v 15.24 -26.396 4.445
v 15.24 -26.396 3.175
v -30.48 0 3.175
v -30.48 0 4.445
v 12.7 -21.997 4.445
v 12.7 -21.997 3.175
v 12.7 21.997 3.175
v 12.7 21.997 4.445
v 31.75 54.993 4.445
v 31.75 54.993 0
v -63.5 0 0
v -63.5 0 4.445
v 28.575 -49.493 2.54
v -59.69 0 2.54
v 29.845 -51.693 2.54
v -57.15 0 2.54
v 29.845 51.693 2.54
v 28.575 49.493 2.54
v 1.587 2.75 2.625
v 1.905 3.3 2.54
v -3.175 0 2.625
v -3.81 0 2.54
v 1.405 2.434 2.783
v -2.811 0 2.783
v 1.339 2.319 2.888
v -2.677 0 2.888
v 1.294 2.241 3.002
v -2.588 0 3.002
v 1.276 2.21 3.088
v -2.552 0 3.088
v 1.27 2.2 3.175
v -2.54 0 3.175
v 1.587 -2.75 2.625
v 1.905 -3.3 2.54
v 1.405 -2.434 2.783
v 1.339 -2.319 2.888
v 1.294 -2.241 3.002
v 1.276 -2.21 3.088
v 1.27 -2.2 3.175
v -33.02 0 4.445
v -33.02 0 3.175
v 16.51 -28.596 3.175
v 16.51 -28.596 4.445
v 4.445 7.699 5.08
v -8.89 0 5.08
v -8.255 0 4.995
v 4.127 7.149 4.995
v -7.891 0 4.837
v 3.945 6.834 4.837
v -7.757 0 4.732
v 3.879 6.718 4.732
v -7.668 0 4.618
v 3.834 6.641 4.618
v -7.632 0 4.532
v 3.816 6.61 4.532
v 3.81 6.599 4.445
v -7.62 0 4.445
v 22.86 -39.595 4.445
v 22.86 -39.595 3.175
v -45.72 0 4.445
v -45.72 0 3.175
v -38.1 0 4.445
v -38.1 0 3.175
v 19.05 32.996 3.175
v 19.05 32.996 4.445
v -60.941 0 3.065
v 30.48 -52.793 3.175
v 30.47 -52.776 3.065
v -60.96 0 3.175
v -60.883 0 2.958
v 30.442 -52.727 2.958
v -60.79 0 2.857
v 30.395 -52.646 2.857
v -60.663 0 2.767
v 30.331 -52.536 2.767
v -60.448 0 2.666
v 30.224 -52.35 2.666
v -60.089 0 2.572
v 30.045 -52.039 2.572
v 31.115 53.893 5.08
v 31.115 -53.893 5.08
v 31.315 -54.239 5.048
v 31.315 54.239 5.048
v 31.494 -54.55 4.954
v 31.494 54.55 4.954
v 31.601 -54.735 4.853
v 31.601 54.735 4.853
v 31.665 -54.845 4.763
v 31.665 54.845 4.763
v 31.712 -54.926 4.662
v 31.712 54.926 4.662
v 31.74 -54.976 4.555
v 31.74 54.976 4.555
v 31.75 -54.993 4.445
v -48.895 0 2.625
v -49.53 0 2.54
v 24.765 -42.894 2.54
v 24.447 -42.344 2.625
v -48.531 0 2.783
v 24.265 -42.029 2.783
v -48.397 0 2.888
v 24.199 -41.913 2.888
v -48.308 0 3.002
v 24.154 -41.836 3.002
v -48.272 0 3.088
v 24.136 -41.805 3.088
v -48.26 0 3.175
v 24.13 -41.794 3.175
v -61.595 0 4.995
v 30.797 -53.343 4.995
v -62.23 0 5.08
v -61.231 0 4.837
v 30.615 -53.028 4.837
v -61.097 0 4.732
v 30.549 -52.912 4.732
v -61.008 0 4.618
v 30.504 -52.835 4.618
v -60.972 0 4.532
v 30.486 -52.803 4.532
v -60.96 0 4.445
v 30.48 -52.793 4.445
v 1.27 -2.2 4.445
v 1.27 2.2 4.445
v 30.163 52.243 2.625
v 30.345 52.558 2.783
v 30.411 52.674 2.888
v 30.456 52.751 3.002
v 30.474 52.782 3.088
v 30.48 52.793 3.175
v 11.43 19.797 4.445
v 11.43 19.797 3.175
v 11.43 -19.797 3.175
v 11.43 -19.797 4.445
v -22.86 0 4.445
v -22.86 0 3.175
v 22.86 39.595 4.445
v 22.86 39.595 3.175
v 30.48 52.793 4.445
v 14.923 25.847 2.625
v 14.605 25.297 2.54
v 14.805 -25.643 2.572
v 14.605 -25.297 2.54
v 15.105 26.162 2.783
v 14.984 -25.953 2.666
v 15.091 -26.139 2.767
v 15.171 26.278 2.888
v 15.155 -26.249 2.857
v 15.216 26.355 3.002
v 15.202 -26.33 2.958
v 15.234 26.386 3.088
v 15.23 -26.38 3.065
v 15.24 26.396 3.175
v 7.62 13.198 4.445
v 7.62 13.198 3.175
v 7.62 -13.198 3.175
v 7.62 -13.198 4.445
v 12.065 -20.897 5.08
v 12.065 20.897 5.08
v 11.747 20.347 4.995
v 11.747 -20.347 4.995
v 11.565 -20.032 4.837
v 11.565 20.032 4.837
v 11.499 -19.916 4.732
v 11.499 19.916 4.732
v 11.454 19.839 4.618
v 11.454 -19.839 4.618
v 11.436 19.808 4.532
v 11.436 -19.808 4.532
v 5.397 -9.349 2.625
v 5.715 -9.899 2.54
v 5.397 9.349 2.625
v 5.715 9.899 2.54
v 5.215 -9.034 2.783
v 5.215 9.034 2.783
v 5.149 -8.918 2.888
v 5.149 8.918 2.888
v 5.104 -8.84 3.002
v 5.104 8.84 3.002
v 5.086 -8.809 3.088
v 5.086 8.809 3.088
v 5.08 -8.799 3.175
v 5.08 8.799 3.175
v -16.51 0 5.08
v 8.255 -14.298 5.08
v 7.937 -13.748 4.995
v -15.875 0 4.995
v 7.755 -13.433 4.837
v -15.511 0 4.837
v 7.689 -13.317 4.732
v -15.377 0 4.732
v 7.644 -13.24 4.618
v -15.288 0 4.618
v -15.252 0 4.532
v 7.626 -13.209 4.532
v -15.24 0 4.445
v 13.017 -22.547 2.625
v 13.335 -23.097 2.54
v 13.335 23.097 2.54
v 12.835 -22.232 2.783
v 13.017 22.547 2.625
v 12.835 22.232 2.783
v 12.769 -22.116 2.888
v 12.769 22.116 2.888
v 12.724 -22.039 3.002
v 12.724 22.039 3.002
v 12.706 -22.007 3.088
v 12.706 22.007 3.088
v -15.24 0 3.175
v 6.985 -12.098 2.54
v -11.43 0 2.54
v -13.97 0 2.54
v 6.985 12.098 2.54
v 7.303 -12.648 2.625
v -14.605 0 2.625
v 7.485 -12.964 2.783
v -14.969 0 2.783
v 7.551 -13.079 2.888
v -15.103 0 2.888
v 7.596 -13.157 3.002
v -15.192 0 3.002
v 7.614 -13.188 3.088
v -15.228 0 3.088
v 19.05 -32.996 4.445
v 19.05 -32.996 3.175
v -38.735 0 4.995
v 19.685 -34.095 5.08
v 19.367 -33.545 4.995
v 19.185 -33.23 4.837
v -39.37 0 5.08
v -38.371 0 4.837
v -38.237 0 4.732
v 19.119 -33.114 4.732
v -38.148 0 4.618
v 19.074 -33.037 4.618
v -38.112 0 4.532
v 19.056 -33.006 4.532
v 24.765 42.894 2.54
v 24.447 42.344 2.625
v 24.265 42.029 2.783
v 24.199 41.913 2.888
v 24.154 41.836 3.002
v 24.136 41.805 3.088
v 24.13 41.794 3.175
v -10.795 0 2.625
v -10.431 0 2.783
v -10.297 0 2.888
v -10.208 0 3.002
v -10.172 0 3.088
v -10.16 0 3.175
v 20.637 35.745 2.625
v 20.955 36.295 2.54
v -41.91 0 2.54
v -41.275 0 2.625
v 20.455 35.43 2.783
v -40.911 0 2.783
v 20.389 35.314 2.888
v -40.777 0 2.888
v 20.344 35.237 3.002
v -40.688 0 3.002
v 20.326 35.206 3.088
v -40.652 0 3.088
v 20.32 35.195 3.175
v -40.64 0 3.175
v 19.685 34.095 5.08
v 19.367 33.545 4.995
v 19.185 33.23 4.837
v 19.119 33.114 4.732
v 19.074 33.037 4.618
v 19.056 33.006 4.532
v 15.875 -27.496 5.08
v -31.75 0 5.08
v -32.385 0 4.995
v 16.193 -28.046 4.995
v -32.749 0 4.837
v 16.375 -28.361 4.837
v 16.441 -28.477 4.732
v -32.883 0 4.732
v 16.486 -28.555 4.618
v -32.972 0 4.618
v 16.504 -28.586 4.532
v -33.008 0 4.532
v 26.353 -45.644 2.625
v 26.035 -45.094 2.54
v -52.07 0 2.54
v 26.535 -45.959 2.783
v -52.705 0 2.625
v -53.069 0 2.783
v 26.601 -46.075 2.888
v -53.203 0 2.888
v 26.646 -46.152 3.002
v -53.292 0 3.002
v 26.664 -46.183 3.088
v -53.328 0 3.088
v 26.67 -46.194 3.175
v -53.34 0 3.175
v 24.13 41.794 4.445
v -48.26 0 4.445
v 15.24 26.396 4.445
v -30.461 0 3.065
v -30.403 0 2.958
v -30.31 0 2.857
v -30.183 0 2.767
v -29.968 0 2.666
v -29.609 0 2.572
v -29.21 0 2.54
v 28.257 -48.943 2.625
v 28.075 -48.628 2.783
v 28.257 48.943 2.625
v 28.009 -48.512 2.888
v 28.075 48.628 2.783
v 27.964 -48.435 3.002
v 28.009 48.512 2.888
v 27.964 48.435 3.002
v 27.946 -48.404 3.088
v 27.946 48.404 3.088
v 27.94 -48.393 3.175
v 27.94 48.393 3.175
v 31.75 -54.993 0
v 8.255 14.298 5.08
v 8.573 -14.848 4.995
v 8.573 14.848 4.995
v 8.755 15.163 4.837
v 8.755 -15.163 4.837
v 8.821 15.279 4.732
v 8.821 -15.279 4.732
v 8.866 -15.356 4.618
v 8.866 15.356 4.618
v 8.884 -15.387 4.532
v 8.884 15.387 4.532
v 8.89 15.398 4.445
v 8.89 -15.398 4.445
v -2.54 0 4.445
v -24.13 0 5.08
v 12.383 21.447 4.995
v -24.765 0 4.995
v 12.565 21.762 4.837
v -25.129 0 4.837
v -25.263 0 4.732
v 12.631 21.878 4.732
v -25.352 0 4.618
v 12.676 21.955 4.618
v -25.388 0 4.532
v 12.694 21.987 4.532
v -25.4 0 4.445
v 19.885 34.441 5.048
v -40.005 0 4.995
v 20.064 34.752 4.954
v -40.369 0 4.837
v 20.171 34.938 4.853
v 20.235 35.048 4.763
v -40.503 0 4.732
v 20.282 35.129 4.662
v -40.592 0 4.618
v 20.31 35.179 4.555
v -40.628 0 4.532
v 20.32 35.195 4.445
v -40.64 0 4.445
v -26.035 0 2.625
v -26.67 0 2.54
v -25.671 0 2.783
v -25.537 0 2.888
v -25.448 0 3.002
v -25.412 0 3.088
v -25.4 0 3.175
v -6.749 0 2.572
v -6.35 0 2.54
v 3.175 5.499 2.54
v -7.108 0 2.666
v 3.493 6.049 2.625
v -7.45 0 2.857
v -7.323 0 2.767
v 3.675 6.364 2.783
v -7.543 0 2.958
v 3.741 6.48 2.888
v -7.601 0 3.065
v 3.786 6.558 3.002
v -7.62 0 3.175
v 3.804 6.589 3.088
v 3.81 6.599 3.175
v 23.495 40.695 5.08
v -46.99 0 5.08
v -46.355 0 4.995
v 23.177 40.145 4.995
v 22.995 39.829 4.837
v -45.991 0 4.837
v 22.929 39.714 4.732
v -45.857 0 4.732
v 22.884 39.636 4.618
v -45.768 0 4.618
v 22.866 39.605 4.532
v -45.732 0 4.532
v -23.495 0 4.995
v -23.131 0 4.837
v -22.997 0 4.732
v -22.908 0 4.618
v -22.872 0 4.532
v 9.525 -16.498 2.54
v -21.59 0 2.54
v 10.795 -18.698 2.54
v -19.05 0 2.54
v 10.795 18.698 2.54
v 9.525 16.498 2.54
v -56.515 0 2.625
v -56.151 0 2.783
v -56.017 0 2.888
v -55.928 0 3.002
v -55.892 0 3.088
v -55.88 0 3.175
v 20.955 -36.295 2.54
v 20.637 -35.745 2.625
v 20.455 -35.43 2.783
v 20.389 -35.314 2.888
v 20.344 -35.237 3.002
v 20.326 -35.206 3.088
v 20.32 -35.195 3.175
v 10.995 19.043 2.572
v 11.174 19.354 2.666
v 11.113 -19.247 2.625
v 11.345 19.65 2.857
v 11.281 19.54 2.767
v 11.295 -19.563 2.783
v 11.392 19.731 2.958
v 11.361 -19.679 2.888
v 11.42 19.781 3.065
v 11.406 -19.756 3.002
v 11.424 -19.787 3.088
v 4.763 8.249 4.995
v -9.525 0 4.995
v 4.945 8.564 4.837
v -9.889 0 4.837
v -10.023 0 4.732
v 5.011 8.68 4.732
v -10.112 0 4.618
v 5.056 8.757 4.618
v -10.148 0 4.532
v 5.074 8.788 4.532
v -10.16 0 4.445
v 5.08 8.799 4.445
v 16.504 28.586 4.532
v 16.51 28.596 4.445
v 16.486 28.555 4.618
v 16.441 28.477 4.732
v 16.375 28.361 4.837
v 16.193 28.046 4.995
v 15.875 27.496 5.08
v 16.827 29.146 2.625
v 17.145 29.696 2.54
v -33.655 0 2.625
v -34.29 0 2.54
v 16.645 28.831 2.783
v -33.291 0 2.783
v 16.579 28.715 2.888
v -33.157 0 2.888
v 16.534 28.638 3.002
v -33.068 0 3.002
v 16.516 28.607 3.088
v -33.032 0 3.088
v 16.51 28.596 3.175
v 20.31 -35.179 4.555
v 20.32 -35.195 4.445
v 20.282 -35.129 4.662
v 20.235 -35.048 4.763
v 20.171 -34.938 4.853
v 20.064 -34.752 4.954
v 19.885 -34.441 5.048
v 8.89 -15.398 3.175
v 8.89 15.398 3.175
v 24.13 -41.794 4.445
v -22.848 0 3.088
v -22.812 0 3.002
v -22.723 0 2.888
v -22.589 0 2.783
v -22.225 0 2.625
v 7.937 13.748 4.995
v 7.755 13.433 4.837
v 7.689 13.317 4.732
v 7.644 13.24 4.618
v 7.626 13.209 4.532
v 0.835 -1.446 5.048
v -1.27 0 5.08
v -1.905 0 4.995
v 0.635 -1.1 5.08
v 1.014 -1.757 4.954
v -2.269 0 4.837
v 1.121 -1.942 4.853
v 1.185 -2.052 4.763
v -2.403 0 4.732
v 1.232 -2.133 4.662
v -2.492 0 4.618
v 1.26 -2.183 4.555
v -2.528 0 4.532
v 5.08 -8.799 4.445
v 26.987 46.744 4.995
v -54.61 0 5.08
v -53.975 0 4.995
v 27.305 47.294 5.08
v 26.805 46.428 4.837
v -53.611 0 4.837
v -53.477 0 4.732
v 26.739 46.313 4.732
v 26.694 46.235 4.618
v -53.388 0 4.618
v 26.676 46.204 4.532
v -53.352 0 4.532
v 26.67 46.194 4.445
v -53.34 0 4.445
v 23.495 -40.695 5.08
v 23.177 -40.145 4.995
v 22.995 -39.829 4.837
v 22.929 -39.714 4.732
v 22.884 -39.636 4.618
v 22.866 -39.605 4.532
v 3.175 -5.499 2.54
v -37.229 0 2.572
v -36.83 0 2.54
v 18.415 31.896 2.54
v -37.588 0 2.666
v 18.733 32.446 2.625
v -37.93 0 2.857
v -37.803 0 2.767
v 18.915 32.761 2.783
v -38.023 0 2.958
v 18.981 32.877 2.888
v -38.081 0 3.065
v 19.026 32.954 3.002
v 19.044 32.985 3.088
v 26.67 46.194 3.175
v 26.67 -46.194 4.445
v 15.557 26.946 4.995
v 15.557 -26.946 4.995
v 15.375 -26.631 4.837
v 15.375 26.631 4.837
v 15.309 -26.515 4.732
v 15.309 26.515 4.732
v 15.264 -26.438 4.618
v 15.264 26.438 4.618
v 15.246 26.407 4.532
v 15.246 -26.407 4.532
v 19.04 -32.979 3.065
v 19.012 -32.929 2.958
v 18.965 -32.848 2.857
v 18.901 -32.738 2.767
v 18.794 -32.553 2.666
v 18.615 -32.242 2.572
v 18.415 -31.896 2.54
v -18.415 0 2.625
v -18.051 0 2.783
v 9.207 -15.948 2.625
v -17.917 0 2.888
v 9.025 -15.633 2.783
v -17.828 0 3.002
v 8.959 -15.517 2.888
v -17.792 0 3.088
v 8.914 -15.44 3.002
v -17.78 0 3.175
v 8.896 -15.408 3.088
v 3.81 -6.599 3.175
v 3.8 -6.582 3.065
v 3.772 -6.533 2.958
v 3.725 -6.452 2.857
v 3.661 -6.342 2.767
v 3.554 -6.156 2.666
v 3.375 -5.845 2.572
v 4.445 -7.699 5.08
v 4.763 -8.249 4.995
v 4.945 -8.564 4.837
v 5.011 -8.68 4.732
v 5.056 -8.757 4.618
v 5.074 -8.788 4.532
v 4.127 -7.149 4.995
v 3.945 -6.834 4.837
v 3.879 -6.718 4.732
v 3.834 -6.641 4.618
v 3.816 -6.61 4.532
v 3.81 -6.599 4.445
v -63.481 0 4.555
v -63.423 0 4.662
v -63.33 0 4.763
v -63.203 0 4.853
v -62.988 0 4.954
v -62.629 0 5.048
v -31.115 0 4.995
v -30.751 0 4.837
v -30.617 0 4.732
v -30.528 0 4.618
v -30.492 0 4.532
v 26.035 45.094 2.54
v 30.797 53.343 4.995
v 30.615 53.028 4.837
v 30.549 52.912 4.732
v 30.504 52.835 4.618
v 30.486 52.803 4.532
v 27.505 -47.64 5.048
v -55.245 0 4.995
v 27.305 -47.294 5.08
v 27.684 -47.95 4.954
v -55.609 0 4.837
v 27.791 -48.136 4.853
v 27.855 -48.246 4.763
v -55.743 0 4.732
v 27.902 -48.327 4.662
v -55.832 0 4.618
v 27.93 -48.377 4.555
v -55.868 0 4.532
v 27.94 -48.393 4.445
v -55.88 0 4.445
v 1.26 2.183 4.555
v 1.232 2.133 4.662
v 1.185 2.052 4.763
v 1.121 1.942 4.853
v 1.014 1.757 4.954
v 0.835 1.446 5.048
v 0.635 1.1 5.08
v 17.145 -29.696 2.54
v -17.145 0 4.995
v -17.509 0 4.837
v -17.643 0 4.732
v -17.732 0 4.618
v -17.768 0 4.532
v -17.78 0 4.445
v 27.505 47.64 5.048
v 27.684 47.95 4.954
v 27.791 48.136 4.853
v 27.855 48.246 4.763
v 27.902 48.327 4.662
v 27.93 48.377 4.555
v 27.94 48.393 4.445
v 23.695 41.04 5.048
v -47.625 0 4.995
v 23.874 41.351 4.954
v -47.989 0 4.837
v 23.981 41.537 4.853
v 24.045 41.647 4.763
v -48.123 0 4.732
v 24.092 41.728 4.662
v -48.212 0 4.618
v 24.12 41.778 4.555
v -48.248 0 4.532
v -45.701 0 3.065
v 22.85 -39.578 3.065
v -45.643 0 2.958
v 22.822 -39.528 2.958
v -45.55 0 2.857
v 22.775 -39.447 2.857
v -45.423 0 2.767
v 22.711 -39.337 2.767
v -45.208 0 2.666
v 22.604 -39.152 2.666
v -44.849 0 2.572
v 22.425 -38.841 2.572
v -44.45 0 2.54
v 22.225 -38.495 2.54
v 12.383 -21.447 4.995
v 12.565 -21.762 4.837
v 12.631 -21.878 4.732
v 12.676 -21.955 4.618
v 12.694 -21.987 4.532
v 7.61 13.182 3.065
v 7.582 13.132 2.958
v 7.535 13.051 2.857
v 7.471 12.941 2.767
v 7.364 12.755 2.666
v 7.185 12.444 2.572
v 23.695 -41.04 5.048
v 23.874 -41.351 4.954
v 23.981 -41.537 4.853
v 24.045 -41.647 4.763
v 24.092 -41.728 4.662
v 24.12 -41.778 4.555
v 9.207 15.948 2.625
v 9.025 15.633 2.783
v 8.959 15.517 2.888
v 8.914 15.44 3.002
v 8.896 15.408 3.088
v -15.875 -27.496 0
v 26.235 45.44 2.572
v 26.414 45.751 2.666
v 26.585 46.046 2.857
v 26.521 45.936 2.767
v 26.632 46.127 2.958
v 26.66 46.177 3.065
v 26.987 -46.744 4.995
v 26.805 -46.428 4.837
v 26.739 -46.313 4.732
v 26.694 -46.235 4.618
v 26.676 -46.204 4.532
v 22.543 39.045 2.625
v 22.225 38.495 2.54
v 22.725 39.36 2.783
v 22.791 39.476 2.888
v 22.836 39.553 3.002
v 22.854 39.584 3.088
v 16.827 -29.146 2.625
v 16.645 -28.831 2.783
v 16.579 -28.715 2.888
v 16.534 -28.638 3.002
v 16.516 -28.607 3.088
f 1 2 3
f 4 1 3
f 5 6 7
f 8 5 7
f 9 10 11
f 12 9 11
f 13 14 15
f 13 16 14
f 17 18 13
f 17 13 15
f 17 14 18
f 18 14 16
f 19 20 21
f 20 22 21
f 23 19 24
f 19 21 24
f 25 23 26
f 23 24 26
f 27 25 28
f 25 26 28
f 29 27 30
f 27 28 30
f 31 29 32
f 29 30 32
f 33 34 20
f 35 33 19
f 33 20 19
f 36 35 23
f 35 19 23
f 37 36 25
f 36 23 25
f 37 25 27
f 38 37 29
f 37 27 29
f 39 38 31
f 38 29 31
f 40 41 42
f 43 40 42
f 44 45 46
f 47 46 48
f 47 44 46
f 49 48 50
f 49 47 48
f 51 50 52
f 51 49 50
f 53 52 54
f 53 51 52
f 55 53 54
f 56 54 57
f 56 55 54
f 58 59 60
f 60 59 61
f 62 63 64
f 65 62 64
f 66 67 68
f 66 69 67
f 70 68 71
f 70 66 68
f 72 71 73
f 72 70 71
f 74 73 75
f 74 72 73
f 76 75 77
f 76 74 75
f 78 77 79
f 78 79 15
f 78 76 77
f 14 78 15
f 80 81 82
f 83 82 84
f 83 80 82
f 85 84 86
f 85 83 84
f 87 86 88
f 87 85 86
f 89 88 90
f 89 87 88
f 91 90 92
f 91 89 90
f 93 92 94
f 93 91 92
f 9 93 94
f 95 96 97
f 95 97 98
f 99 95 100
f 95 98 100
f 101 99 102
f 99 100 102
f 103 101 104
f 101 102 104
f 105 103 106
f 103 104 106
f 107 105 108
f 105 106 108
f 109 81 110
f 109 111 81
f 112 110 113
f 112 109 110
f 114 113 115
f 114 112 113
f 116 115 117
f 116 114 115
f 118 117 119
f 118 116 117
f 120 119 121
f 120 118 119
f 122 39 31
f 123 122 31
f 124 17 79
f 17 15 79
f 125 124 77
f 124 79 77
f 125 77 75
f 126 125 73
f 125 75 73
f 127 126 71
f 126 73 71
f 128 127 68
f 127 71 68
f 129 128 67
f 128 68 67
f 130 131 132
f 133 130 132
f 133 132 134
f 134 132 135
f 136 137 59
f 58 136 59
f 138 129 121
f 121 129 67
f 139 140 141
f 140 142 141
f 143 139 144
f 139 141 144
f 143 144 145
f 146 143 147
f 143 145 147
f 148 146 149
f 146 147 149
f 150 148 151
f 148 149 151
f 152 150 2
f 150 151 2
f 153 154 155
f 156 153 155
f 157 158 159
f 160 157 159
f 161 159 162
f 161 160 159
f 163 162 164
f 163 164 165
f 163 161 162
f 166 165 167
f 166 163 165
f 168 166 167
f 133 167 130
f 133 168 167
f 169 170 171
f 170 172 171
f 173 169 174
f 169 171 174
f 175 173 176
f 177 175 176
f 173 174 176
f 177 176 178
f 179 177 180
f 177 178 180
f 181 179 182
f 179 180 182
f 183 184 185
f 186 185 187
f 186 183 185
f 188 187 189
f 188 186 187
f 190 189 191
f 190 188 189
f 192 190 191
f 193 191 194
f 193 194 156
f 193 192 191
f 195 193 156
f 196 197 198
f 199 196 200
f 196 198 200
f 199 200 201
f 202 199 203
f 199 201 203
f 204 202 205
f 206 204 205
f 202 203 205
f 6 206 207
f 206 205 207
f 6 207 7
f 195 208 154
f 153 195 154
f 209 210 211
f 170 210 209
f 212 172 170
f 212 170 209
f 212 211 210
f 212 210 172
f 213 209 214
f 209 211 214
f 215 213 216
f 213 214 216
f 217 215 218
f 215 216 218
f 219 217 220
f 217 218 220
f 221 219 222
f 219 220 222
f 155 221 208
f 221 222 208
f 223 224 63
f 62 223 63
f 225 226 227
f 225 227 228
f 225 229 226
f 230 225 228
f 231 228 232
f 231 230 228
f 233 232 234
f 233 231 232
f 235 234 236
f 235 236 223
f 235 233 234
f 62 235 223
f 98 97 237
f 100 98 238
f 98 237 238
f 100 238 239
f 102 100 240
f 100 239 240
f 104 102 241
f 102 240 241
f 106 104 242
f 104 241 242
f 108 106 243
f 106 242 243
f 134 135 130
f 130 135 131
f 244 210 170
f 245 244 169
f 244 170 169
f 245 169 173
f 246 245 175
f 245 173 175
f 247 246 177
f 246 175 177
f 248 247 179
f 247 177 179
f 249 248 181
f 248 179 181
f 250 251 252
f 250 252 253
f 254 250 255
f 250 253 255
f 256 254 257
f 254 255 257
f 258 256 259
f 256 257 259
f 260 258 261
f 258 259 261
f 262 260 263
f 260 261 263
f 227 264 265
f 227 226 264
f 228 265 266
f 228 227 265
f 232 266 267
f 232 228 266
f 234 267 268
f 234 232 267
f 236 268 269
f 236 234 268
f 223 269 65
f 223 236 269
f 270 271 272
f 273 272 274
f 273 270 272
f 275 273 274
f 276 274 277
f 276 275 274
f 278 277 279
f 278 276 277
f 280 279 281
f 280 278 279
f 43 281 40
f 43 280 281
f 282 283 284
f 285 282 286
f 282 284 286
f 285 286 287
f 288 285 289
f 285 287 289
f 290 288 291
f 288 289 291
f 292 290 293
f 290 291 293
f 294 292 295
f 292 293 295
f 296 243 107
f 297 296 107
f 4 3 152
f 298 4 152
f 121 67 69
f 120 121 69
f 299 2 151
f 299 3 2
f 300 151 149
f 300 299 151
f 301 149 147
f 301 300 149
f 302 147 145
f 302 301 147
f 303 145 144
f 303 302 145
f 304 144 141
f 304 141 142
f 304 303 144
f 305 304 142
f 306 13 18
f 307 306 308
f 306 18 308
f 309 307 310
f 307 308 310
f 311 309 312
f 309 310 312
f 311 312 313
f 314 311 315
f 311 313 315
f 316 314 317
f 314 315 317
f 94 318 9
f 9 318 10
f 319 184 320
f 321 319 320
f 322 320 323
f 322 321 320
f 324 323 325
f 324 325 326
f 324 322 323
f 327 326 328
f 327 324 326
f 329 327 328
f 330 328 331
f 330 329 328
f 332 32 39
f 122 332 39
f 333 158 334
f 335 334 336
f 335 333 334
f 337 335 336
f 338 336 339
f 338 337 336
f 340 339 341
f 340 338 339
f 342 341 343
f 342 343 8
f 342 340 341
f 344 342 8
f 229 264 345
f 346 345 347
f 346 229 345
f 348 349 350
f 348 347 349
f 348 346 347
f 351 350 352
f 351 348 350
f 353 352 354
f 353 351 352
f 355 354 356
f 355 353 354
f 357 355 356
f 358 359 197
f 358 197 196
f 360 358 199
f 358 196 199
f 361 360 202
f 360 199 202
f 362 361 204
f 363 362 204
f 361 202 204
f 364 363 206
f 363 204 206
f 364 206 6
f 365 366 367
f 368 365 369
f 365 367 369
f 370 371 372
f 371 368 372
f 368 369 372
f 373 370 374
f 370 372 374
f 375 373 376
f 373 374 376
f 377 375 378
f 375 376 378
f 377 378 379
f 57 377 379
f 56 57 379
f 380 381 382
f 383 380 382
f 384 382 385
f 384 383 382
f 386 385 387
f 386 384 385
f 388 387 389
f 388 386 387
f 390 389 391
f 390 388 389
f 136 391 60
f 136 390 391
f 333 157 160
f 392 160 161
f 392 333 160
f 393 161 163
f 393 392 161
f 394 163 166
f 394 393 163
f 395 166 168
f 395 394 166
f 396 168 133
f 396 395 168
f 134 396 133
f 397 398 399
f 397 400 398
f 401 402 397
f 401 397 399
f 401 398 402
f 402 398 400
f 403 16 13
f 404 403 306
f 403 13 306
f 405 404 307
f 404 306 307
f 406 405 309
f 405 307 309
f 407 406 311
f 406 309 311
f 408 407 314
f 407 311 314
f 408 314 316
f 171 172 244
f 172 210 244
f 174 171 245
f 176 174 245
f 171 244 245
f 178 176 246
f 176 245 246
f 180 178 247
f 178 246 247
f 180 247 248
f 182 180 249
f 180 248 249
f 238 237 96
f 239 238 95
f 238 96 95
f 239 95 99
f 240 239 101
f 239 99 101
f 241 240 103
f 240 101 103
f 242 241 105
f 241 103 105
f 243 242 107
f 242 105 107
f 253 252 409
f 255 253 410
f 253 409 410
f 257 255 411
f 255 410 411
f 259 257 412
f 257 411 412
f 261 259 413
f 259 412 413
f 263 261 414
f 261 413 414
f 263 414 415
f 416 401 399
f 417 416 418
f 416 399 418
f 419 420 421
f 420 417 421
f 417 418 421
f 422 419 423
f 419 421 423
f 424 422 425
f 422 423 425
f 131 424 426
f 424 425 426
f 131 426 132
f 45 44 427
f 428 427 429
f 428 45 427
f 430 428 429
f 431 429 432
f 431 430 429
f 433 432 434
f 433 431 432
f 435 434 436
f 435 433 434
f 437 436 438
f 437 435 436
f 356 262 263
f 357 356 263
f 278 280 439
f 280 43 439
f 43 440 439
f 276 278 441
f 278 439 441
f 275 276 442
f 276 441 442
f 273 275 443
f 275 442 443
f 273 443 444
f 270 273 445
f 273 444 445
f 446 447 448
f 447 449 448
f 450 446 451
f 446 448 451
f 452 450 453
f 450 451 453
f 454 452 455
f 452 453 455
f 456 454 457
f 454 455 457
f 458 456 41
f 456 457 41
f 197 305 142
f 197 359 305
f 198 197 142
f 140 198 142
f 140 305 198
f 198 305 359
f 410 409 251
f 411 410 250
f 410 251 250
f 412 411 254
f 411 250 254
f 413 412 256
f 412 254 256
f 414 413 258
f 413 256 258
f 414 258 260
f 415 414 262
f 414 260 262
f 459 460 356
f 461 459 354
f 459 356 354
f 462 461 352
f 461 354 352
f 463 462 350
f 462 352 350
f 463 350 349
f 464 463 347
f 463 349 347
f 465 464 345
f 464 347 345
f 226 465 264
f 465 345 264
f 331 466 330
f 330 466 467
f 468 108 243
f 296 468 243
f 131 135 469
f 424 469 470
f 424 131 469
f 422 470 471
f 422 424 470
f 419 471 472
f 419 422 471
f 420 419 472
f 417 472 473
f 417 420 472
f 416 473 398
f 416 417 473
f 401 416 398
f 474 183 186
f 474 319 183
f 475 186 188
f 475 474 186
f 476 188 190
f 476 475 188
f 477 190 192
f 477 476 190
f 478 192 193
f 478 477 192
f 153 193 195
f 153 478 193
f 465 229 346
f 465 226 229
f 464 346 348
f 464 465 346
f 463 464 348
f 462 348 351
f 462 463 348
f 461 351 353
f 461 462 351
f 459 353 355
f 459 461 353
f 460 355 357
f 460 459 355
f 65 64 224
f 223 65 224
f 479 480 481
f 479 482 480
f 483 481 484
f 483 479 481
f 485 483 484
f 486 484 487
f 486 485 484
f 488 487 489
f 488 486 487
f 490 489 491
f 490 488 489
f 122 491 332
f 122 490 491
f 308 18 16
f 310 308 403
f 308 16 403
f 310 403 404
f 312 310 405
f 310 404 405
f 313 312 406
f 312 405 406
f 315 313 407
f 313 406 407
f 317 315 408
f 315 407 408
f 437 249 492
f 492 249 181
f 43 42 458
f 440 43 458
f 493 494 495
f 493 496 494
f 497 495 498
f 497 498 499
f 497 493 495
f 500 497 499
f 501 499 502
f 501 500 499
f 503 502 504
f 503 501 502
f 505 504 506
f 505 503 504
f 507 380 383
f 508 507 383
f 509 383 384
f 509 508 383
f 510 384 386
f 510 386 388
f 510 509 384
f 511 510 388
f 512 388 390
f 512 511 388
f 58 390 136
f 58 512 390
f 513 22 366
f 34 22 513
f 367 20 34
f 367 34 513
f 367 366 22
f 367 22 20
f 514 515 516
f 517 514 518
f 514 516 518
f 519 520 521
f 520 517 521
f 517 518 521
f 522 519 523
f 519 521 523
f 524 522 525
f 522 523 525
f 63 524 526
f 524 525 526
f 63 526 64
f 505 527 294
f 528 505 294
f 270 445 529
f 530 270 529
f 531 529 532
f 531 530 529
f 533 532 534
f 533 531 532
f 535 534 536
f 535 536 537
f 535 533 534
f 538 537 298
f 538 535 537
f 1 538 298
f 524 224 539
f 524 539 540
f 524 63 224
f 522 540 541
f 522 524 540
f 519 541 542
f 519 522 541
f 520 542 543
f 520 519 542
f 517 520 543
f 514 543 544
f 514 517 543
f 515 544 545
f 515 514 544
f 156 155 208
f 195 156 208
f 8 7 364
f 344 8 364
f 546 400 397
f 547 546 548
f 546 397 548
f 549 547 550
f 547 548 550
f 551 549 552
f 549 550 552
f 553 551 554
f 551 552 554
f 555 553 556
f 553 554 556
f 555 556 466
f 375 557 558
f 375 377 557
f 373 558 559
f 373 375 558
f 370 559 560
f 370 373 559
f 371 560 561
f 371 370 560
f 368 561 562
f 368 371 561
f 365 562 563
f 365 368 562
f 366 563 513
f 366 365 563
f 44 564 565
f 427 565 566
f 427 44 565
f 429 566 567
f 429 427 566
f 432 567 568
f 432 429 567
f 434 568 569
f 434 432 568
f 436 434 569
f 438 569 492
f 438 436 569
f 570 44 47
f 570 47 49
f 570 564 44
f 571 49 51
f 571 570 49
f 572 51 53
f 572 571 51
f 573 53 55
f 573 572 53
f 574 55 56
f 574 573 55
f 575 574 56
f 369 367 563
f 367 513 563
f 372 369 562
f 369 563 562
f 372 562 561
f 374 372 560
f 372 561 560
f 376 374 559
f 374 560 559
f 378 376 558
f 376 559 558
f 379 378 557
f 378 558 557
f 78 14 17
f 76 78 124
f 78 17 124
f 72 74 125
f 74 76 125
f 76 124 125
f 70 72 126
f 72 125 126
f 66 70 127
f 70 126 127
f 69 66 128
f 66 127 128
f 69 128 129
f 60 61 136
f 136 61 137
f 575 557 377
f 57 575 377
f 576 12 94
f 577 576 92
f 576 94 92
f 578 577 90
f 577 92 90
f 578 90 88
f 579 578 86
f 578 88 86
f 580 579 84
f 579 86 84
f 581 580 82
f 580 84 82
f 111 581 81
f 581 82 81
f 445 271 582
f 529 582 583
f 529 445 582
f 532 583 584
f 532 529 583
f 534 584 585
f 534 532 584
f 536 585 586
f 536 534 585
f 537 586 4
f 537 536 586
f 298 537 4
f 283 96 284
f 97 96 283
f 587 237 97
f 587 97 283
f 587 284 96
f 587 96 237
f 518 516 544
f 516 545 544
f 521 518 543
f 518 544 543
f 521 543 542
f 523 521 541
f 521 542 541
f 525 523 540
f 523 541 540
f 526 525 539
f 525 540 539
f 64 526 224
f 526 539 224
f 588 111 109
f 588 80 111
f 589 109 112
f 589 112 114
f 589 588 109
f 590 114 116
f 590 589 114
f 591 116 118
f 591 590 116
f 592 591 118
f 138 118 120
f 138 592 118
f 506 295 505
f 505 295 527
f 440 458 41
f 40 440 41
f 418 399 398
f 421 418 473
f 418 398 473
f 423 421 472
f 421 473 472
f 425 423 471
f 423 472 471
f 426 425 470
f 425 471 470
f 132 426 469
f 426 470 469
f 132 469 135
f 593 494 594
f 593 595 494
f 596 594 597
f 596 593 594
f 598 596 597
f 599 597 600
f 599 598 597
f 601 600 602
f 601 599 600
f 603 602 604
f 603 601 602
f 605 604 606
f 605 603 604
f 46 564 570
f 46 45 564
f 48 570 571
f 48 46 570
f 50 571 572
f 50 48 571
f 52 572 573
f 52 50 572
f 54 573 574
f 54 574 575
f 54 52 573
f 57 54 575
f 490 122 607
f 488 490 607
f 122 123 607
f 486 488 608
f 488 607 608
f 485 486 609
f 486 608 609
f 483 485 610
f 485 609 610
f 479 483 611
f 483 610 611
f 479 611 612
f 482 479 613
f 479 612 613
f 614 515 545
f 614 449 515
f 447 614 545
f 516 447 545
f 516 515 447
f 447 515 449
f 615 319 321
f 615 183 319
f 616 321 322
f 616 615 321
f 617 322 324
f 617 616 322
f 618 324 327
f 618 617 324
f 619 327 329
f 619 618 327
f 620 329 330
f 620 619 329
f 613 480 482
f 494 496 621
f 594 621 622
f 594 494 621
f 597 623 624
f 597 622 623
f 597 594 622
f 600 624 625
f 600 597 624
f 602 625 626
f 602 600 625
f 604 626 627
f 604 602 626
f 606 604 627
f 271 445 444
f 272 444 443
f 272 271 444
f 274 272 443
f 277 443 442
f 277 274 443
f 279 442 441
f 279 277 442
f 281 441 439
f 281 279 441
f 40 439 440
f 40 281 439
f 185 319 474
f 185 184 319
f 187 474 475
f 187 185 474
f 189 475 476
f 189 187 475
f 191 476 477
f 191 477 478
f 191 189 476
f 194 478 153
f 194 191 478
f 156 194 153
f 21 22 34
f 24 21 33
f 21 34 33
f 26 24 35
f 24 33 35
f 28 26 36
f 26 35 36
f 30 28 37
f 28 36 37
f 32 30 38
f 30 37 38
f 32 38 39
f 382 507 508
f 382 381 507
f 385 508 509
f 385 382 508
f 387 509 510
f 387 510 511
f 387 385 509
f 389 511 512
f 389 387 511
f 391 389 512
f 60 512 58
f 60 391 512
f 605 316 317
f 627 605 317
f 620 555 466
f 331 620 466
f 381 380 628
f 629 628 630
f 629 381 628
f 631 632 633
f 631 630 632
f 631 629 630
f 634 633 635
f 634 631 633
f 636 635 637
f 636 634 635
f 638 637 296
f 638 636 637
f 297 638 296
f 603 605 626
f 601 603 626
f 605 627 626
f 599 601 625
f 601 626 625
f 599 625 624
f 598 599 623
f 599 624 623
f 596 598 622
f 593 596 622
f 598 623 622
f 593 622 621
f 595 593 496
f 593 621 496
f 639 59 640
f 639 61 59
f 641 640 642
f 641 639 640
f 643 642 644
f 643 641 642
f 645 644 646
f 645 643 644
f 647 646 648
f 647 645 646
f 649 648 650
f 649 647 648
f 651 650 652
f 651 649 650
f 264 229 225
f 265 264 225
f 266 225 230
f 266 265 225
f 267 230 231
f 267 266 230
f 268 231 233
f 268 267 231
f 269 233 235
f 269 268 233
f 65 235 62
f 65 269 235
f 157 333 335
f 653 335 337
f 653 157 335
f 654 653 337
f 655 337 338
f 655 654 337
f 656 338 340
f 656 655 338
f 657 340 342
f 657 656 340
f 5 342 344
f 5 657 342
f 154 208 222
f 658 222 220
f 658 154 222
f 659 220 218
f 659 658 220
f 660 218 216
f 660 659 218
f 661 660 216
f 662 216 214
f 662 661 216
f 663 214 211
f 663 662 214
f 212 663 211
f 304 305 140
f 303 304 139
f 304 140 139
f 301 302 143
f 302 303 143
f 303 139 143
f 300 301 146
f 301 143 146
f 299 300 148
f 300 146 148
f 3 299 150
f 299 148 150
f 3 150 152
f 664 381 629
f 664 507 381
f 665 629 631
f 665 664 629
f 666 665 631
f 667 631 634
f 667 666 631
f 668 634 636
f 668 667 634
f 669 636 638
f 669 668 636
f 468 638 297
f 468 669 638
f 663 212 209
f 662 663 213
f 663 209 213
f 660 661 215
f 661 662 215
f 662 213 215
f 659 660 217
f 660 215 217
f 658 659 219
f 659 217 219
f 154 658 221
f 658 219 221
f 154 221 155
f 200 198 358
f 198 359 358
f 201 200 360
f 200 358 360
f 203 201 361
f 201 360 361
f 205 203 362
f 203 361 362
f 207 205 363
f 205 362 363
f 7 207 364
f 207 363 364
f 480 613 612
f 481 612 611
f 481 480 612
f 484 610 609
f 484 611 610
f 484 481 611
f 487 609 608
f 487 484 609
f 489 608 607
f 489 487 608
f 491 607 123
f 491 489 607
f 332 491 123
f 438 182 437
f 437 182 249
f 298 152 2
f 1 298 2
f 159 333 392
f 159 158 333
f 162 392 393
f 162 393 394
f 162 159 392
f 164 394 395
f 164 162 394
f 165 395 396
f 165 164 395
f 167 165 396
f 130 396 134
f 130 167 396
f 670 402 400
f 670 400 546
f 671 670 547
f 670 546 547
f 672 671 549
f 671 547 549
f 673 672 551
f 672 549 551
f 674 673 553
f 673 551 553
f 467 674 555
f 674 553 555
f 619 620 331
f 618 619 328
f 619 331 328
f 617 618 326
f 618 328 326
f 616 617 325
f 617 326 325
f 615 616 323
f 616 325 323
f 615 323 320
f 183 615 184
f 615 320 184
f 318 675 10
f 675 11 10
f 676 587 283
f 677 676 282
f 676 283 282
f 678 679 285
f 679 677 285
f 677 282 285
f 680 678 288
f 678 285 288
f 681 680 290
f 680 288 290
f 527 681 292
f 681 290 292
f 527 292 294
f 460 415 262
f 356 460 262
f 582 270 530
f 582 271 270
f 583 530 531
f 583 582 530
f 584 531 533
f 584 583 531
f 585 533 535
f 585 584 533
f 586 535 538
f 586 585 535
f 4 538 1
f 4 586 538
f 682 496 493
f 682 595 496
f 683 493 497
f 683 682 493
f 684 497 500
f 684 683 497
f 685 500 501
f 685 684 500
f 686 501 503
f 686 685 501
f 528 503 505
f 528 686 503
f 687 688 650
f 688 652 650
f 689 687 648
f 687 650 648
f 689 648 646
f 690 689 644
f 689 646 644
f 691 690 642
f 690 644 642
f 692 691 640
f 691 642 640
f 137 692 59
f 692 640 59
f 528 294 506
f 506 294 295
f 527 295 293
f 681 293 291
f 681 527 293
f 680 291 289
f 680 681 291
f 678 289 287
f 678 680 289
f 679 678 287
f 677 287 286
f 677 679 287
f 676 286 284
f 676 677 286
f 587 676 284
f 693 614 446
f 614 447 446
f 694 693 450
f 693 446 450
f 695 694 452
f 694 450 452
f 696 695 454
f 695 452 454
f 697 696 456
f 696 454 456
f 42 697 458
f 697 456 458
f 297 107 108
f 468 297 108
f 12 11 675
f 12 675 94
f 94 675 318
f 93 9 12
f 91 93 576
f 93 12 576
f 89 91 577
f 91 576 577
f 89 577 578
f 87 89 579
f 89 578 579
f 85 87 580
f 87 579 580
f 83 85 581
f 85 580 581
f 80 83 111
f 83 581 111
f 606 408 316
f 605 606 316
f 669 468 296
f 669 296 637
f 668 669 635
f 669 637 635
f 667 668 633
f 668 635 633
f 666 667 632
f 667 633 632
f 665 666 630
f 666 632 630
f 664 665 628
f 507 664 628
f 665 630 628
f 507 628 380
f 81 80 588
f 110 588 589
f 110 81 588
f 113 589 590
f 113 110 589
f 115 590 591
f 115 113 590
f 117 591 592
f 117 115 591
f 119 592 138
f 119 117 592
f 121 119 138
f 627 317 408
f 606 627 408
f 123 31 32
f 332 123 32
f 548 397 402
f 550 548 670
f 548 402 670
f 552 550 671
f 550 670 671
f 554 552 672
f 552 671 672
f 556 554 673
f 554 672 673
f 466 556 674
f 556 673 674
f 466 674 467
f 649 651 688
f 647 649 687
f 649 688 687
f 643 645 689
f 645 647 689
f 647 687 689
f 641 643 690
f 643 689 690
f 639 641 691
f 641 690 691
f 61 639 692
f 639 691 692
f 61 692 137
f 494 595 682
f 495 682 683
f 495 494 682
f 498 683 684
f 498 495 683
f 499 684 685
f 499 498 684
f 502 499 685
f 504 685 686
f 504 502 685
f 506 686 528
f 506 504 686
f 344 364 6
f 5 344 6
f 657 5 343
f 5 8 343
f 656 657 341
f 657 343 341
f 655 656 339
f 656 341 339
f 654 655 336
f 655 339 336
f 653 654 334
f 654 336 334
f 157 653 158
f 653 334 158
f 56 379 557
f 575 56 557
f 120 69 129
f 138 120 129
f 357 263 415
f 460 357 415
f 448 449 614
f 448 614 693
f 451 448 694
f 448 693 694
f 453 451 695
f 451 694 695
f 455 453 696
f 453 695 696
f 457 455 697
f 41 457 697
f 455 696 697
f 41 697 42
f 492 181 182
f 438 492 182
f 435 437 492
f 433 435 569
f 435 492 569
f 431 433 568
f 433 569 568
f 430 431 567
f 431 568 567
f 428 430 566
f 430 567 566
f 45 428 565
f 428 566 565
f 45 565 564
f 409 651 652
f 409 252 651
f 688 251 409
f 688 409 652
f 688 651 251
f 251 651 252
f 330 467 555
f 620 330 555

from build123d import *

# Parameters (mm, degrees)
F1_DEPTH = 2.54
F3_DEPTH = 2.54
F4_R     = 0.63499


# Not quite as in the source:
# - a fillet or chamfer is up to 0.001 mm smaller than in the source, because OpenCascade refuses the exact size


with BuildPart() as f1:
    # F0 (on Top) → F1 (new body)
    with BuildSketch(Plane.XY):
        with BuildLine():
            ThreePointArc((-15.8749996872, -27.4963067508), (15.8750001564, -27.4963064799), (31.75, 0))
            ThreePointArc((31.75, 0), (15.8749996133, 27.4963067934), (-15.8750007733, 27.4963061237))
            ThreePointArc((-15.8750007733, 27.4963061237), (-31.75, -6.271e-07), (-15.8749996872, -27.4963067508))
        make_face()
        with BuildLine():
            Line((31.75, -54.9926131403), (31.75, 0))
            ThreePointArc((31.75, 0), (15.8750001564, -27.4963064799), (-15.8749996872, -27.4963067508))
            Line((-15.8749996872, -27.4963067508), (31.75, -54.9926131403))
        make_face()
        with BuildLine():
            ThreePointArc((-15.8750007733, 27.4963061237), (15.8749996133, 27.4963067934), (31.75, 0))
            Line((31.75, 0), (31.75, 54.9926131403))
            Line((31.75, 54.9926131403), (-15.8750007733, 27.4963061237))
        make_face()
        with BuildLine():
            ThreePointArc((-15.8749996872, -27.4963067508), (-31.75, -6.271e-07), (-15.8750007733, 27.4963061237))
            Line((-15.8750007733, 27.4963061237), (-63.5, 0))
            Line((-63.5, 0), (-15.8749996872, -27.4963067508))
        make_face()
    extrude(amount=F1_DEPTH)

    # F2 (on face) → F3 (join)
    with BuildSketch(Plane.XY.offset(2.54)):
        Polygon((31.75, 54.9926131403), (-63.5, 0), (31.75, -54.9926131403), align=None)
        Polygon((30.48, -52.7929086147), (-60.96, 0), (30.48, 52.7929086147), align=None, mode=Mode.SUBTRACT)
        Polygon((27.94, 48.3934995635), (-55.88, 0), (27.94, -48.3934995635), align=None)
        Polygon((-53.34, 0), (26.67, 46.1937950379), (26.67, -46.1937950379), align=None, mode=Mode.SUBTRACT)
        Polygon((24.13, 41.7943859866), (-48.26, 0), (24.13, -41.7943859866), align=None)
        Polygon((22.86, -39.594681461), (-45.72, 0), (22.86, 39.594681461), align=None, mode=Mode.SUBTRACT)
        Polygon((20.32, 35.1952724098), (-40.64, 0), (20.32, -35.1952724098), align=None)
        Polygon((19.05, -32.9955678842), (-38.1, 0), (19.05, 32.9955678842), align=None, mode=Mode.SUBTRACT)
        Polygon((16.51, 28.596158833), (-33.02, 0), (16.51, -28.596158833), align=None)
        Polygon((15.24, -26.3964543073), (-30.48, 0), (15.24, 26.3964543073), align=None, mode=Mode.SUBTRACT)
        Polygon((12.7, 21.9970452561), (-25.4, 0), (12.7, -21.9970452561), align=None)
        Polygon((-22.86, 0), (11.43, 19.7973407305), (11.43, -19.7973407305), align=None, mode=Mode.SUBTRACT)
        Polygon((8.89, -15.3979316793), (8.89, 15.3979316793), (-17.78, 0), align=None)
        Polygon((-15.24, 0), (7.62, 13.1982271537), (7.62, -13.1982271537), align=None, mode=Mode.SUBTRACT)
        Polygon((5.08, -8.7988181024), (5.08, 8.7988181024), (-10.16, 0), align=None)
        Polygon((3.81, -6.5991135768), (-7.62, 0), (3.81, 6.5991135768), align=None, mode=Mode.SUBTRACT)
        Polygon((1.27, 2.1997045256), (-2.54, 0), (1.27, -2.1997045256), align=None)
    extrude(amount=F3_DEPTH)

    # F4 (radius 0.635 in the source; OpenCascade refuses exactly that, so slightly less here)
    f4_edges = [f1.edges().sort_by_distance(p)[0] for p in [
        (-15.875, 27.496307, 5.08),
        (-15.875, -27.496307, 5.08),
        (31.75, 0, 5.08),
        (-15.24, -26.396454, 5.08),
        (-15.24, 26.396454, 5.08),
        (30.48, 0, 5.08),
        (-15.24, -26.396454, 2.54),
        (-15.24, 26.396454, 2.54),
        (30.48, 0, 2.54),
        (27.94, 0, 2.54),
        (-13.97, 24.19675, 2.54),
        (-13.97, -24.19675, 2.54),
        (27.94, 0, 5.08),
        (-13.97, 24.19675, 5.08),
        (-13.97, -24.19675, 5.08),
        (-13.335, -23.096898, 5.08),
        (-13.335, 23.096898, 5.08),
        (26.67, 0, 5.08),
        (-13.335, -23.096898, 2.54),
        (-13.335, 23.096898, 2.54),
        (26.67, 0, 2.54),
        (24.13, 0, 2.54),
        (-12.065, 20.897193, 2.54),
        (-12.065, -20.897193, 2.54),
        (24.13, 0, 5.08),
        (-12.065, 20.897193, 5.08),
        (-12.065, -20.897193, 5.08),
        (-11.43, -19.797341, 5.08),
        (-11.43, 19.797341, 5.08),
        (22.86, 0, 5.08),
        (-11.43, -19.797341, 2.54),
        (-11.43, 19.797341, 2.54),
        (22.86, 0, 2.54),
        (20.32, 0, 2.54),
        (-10.16, 17.597636, 2.54),
        (-10.16, -17.597636, 2.54),
        (20.32, 0, 5.08),
        (-10.16, 17.597636, 5.08),
        (-10.16, -17.597636, 5.08),
        (-9.525, -16.497784, 5.08),
        (-9.525, 16.497784, 5.08),
        (19.05, 0, 5.08),
        (-9.525, -16.497784, 2.54),
        (-9.525, 16.497784, 2.54),
        (19.05, 0, 2.54),
        (-8.255, 14.298079, 2.54),
        (-8.255, -14.298079, 2.54),
        (16.51, 0, 2.54),
        (-8.255, 14.298079, 5.08),
        (-8.255, -14.298079, 5.08),
        (16.51, 0, 5.08),
        (-7.62, -13.198227, 5.08),
        (-7.62, 13.198227, 5.08),
        (15.24, 0, 5.08),
        (-7.62, -13.198227, 2.54),
        (-7.62, 13.198227, 2.54),
        (15.24, 0, 2.54),
        (-6.35, 10.998523, 2.54),
        (-6.35, -10.998523, 2.54),
        (12.7, 0, 2.54),
        (-6.35, 10.998523, 5.08),
        (-6.35, -10.998523, 5.08),
        (12.7, 0, 5.08),
        (-5.715, -9.89867, 5.08),
        (-5.715, 9.89867, 5.08),
        (11.43, 0, 5.08),
        (-5.715, -9.89867, 2.54),
        (-5.715, 9.89867, 2.54),
        (11.43, 0, 2.54),
        (8.89, 0, 2.54),
        (-4.445, 7.698966, 2.54),
        (-4.445, -7.698966, 2.54),
        (8.89, 0, 5.08),
        (-4.445, 7.698966, 5.08),
        (-4.445, -7.698966, 5.08),
        (-3.81, -6.599114, 5.08),
        (-3.81, 6.599114, 5.08),
        (7.62, 0, 5.08),
        (-3.81, -6.599114, 2.54),
        (-3.81, 6.599114, 2.54),
        (7.62, 0, 2.54),
        (5.08, 0, 2.54),
        (-2.54, 4.399409, 2.54),
        (-2.54, -4.399409, 2.54),
        (5.08, 0, 5.08),
        (-2.54, 4.399409, 5.08),
        (-2.54, -4.399409, 5.08),
        (-1.905, -3.299557, 5.08),
        (-1.905, 3.299557, 5.08),
        (3.81, 0, 5.08),
        (-1.905, -3.299557, 2.54),
        (-1.905, 3.299557, 2.54),
        (3.81, 0, 2.54),
        (1.27, 0, 2.54),
        (-0.635, 1.099852, 2.54),
        (-0.635, -1.099852, 2.54),
        (1.27, 0, 5.08),
        (-0.635, 1.099852, 5.08),
        (-0.635, -1.099852, 5.08),
    ]]
    fillet(f4_edges, radius=F4_R)


solid = f1.part
